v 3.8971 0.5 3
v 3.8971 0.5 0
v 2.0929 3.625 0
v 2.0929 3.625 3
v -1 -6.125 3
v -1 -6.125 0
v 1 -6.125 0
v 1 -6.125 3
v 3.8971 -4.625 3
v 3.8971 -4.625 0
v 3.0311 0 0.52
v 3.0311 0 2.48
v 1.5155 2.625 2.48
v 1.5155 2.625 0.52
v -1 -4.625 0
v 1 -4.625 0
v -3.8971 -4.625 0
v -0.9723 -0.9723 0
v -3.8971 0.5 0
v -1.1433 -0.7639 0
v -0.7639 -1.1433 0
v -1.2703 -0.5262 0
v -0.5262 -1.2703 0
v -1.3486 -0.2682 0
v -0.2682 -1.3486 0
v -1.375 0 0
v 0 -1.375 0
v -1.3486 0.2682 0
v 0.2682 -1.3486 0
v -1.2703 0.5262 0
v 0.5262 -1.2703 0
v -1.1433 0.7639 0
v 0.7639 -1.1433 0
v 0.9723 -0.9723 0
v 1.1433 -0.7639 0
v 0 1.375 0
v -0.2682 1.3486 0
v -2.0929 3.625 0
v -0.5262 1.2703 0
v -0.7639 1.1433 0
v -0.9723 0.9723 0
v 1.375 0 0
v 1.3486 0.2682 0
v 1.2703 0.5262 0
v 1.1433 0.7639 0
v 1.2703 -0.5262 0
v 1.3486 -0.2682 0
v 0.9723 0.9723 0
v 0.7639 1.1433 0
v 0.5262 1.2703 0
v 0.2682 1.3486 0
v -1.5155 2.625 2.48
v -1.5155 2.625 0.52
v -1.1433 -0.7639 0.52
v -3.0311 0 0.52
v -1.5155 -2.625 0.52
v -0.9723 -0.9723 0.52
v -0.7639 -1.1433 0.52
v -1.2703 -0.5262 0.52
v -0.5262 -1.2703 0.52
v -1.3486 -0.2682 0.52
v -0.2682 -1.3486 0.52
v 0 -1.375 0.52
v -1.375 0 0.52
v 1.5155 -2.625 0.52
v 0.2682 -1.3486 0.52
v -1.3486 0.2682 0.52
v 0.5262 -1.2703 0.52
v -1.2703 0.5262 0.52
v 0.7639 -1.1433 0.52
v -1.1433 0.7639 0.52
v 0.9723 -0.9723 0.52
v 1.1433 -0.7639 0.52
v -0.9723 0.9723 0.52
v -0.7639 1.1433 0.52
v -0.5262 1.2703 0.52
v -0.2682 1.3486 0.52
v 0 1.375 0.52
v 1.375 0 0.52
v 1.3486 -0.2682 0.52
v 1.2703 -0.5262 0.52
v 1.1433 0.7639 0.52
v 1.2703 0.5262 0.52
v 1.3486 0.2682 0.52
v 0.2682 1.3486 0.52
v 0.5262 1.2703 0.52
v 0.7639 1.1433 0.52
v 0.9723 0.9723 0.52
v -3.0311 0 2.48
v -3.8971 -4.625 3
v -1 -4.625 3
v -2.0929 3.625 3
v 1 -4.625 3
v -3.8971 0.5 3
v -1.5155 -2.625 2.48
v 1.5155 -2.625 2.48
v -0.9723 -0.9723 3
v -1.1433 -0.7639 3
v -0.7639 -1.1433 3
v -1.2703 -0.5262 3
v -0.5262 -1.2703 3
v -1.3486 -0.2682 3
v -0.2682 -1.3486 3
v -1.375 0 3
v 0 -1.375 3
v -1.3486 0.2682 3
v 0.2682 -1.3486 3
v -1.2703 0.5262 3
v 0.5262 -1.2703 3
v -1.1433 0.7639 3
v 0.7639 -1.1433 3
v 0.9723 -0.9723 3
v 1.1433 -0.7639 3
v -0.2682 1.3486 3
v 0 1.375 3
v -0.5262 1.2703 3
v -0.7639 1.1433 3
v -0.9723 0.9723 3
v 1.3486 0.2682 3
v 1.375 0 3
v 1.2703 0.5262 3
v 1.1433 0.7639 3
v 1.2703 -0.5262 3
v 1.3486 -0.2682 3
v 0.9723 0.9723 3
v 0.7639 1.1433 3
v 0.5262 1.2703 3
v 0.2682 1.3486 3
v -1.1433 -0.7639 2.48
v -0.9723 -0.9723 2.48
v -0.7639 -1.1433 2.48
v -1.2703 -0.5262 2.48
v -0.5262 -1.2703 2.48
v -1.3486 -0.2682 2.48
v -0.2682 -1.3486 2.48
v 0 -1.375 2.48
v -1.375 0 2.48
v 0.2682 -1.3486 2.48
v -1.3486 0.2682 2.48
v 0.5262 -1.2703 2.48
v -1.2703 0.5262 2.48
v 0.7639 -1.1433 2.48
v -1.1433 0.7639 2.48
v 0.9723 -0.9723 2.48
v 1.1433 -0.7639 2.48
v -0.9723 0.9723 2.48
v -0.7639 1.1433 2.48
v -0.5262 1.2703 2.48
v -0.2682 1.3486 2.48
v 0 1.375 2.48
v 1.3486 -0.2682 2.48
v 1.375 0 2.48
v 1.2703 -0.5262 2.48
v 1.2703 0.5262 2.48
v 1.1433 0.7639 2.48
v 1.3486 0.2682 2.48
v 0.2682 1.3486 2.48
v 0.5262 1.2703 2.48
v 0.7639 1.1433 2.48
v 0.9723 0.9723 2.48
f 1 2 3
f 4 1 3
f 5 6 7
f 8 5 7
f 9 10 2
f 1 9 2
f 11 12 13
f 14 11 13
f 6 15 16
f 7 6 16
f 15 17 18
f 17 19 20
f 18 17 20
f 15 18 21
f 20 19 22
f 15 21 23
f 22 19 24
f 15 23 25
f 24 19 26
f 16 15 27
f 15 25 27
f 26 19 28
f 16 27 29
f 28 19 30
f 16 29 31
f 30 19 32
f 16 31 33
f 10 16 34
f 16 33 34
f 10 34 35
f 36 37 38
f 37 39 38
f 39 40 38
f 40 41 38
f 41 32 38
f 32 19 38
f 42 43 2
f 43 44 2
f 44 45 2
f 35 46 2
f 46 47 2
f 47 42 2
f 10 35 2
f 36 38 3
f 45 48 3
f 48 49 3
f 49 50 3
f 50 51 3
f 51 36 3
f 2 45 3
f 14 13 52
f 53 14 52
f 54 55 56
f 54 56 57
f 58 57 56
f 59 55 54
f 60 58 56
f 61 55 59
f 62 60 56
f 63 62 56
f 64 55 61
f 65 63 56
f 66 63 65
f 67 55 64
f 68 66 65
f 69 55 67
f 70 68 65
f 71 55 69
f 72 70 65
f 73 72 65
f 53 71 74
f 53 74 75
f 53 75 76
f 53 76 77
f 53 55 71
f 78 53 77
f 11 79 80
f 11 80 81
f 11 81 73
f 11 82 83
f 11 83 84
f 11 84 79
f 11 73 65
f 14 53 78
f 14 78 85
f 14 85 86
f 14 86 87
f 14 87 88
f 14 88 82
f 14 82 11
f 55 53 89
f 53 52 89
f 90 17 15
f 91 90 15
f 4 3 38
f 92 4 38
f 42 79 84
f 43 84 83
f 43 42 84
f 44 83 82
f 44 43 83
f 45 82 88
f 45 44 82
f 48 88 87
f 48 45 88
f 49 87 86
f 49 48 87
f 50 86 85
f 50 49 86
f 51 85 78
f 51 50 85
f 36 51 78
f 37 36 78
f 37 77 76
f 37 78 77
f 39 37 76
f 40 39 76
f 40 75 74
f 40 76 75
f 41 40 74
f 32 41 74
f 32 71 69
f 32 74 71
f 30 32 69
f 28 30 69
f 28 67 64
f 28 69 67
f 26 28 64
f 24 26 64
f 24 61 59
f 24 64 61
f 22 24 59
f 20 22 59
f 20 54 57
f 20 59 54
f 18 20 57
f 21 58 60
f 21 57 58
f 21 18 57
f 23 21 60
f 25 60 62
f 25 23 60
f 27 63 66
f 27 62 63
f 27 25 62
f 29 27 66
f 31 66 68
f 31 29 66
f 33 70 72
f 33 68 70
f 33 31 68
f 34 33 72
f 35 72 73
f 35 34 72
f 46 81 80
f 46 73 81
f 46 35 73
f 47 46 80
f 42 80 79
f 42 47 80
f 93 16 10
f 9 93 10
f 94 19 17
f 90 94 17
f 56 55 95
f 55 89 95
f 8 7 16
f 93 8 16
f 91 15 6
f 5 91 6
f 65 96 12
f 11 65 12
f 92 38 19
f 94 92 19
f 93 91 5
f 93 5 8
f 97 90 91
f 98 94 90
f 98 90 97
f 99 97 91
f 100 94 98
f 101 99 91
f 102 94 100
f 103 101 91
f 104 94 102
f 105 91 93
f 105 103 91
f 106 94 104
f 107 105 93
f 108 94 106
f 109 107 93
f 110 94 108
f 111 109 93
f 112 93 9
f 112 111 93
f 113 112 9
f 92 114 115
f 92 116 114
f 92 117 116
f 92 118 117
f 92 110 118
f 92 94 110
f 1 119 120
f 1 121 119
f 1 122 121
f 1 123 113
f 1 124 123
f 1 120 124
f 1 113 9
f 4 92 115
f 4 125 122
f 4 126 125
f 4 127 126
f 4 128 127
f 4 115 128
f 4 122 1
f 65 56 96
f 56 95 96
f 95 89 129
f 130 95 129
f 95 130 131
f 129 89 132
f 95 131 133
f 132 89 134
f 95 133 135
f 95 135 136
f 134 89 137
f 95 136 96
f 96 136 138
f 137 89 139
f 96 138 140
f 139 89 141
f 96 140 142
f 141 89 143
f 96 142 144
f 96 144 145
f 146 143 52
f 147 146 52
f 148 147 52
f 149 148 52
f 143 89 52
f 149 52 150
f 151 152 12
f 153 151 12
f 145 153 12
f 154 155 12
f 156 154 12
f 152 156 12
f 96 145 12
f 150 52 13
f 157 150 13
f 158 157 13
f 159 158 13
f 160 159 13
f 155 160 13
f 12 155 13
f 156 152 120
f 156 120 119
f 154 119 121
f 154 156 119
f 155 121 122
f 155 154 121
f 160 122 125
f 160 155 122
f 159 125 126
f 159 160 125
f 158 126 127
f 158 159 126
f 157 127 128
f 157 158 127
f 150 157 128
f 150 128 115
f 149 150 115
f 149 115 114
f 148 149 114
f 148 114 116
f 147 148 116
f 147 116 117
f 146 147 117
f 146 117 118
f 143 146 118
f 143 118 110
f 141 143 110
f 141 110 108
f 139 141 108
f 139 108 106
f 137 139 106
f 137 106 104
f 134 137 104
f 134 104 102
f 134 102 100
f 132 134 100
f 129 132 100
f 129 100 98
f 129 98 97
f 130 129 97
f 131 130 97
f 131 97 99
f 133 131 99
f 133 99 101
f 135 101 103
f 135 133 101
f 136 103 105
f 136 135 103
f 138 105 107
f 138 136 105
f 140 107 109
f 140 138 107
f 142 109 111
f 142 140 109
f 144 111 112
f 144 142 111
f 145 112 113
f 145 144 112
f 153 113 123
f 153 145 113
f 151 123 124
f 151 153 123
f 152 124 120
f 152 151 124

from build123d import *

# Parameters (mm, degrees)
SKETCH1_R           = 1.375
BOSS_EXTRUDE1_DEPTH = 3
CUT_EXTRUDE1_DEPTH  = 0.98


with BuildPart() as part:
    # Sketch1 → Boss-Extrude1 (new body)
    with BuildSketch(Plane.XY):
        Polygon((-1, -4.625), (-1, -6.125), (1, -6.125), (1, -4.625), (3.897114317, -4.625), (3.897114317, 0.5), (2.092894726, 3.625), (-2.092894726, 3.625), (-3.897114317, 0.5), (-3.897114317, -4.625), align=None)
        Circle(SKETCH1_R, mode=Mode.SUBTRACT)
    extrude(amount=BOSS_EXTRUDE1_DEPTH)

    # Sketch2 → Cut-Extrude1 (cut, symmetric)
    with BuildSketch(Plane.XY.offset(1.5)):
        Polygon((-1.515544457, -2.625), (1.515544457, -2.625), (3.031088913, 0), (1.515544457, 2.625), (-1.515544457, 2.625), (-3.031088913, 0), align=None)
    extrude(amount=CUT_EXTRUDE1_DEPTH, both=True, mode=Mode.SUBTRACT)


solid = part.part
